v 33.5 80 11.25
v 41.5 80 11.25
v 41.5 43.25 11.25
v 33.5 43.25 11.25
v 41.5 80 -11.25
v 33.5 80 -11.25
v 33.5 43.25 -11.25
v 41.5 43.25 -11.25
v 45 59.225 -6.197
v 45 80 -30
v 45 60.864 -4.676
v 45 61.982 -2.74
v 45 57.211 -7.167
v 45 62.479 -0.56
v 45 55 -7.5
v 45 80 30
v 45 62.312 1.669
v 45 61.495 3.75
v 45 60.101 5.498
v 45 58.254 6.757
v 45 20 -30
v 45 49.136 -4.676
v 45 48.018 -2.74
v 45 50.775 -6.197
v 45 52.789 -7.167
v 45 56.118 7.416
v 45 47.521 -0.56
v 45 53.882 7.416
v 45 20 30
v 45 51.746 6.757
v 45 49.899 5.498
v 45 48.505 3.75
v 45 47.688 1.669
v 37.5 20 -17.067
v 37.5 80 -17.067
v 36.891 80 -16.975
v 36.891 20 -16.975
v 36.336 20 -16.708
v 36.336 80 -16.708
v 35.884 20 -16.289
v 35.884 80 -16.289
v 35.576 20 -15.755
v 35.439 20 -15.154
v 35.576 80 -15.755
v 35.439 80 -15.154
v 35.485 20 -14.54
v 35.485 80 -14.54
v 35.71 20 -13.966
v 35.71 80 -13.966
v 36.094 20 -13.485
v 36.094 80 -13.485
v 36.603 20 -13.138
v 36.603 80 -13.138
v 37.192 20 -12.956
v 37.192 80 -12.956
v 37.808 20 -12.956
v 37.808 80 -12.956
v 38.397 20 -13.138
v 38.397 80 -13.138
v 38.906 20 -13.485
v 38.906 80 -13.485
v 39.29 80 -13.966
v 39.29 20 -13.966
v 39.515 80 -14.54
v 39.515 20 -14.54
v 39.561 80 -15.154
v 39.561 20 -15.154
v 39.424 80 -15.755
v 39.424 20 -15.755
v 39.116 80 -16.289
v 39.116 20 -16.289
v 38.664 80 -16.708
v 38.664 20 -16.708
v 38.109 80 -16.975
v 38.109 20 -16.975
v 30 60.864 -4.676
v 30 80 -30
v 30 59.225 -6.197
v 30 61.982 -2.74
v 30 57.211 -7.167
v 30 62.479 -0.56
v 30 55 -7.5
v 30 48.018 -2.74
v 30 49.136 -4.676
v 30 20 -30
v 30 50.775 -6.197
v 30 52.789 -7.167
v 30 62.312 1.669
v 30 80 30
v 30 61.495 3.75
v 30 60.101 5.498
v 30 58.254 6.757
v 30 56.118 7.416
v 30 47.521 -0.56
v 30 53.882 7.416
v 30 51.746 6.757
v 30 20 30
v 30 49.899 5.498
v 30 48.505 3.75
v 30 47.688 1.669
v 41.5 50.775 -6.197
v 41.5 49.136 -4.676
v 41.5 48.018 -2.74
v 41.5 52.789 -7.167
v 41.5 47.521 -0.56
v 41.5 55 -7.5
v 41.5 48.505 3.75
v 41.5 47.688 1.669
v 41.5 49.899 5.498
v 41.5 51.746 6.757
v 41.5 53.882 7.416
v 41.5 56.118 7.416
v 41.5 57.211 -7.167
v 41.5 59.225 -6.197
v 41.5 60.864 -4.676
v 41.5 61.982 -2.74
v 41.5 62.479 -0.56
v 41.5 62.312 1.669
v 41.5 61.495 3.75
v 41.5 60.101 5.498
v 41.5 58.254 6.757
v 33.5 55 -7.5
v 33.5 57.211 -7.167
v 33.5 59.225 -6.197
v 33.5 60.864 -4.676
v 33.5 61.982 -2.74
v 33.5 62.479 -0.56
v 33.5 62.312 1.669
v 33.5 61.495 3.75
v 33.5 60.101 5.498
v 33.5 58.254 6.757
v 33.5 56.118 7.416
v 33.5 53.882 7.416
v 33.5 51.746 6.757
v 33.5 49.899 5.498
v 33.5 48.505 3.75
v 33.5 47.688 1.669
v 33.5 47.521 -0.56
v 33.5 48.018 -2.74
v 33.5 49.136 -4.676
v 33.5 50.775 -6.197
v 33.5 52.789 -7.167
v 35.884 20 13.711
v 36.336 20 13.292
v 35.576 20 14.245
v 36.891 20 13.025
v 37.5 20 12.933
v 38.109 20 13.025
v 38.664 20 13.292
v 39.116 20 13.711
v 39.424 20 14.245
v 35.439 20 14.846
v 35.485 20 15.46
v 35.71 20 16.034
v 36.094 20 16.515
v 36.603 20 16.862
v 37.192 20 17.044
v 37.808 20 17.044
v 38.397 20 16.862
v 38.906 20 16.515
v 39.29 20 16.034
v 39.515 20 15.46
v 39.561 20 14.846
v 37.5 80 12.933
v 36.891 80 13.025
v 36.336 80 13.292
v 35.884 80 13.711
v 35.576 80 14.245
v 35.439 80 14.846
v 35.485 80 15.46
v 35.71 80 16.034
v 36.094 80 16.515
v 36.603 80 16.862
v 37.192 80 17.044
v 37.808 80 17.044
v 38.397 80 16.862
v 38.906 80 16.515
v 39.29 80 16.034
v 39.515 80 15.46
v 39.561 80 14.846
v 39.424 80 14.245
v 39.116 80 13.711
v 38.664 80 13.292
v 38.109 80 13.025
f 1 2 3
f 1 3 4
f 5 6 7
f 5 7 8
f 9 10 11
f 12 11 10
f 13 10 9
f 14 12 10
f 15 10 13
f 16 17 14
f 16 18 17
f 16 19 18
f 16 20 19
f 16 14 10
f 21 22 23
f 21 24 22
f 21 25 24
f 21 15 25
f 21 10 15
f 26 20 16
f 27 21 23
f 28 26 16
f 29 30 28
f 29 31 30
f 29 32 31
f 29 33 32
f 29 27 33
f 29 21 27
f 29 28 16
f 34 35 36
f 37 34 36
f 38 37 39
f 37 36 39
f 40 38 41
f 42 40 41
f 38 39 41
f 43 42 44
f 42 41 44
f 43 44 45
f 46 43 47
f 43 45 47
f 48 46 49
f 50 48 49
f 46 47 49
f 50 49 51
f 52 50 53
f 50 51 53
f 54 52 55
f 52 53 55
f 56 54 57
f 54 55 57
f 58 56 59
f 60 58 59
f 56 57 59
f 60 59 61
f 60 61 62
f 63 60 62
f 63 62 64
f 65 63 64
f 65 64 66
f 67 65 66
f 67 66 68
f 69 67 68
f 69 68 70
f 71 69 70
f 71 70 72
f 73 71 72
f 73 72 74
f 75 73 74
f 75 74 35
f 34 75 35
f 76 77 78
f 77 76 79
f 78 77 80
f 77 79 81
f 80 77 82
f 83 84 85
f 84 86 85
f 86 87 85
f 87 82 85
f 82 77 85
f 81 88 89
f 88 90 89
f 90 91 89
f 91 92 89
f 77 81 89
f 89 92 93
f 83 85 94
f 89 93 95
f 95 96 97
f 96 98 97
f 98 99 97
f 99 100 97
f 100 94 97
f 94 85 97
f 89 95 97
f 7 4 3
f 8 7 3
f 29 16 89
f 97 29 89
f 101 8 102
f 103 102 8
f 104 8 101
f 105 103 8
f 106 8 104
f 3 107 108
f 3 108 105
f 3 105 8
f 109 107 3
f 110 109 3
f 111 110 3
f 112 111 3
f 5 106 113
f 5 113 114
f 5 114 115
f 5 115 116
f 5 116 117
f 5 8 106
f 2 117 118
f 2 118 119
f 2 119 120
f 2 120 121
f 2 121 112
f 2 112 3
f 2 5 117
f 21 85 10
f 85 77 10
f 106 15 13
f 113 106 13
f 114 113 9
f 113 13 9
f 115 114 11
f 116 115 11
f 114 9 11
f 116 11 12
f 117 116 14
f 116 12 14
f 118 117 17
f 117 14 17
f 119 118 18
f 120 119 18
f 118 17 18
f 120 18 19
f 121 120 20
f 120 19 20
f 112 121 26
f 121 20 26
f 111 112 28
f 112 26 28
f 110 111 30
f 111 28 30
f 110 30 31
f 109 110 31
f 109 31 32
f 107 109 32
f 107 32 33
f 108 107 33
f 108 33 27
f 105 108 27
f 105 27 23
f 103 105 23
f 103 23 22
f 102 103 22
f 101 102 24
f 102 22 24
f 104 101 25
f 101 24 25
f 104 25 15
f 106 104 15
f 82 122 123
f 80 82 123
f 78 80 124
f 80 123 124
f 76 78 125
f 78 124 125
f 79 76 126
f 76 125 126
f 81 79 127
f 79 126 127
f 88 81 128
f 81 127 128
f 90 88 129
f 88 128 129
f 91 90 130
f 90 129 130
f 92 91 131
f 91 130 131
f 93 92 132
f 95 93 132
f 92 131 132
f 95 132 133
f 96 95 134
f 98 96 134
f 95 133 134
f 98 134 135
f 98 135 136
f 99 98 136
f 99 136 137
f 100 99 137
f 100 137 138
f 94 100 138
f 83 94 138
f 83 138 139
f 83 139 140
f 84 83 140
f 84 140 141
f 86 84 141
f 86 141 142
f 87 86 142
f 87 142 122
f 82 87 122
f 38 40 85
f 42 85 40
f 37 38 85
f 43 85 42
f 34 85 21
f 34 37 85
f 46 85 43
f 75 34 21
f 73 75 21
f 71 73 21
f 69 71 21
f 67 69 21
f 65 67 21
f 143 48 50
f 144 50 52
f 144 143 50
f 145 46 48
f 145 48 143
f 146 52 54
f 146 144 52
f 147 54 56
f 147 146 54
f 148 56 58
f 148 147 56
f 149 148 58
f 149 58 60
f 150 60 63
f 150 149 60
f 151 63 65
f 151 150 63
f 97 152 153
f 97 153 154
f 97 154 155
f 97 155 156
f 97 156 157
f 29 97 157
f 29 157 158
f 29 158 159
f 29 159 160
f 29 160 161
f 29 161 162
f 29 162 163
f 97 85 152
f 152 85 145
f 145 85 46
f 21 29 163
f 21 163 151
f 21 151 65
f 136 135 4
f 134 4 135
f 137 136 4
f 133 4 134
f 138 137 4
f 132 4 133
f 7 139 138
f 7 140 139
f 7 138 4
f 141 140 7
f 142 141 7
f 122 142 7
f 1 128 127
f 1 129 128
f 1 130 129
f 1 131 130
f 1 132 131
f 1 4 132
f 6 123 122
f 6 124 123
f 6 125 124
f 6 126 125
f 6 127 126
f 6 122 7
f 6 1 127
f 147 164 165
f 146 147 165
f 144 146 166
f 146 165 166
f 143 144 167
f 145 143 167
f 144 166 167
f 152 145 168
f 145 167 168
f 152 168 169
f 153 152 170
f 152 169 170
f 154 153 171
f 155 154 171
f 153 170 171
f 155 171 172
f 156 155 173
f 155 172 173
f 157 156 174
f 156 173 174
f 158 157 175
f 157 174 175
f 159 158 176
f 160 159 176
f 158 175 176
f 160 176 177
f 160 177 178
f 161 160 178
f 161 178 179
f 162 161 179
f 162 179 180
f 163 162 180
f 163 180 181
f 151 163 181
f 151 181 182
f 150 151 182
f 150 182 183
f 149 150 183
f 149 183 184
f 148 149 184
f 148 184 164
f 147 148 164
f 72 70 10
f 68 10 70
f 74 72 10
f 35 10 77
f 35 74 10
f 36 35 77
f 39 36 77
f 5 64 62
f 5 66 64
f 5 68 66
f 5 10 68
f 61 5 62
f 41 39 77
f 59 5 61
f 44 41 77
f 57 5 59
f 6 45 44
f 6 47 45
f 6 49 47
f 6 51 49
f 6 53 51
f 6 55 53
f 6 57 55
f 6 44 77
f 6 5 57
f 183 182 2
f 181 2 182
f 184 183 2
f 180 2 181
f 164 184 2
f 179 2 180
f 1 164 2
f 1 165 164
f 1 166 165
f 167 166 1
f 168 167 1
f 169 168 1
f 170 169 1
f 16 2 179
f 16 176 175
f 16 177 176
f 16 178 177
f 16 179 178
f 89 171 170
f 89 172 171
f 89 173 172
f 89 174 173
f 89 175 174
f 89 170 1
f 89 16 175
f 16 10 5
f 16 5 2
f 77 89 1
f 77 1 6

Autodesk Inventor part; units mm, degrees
ref_plane "YZ Plane" through (0, 0, 0) normal (1, 0, 0) x (0, 1, 0)
ref_plane "XZ Plane" through (0, 0, 0) normal (0, 1, 0) x (-1, 0, 0)
ref_plane "XY Plane" through (0, 0, 0) normal (0, 0, 1) x (1, 0, 0)
sketch "Sketch1" plane through (0, 0, 0) normal (0, 1, 0) x (-1, 0, 0)
  line L0 (45, -30) -> (-45, -30)
  line L1 (-45, -30) -> (-45, 30)
  line L2 (-45, 30) -> (45, 30)
  line L3 (45, 30) -> (45, -30)
  line L4 (45, -30) -> (-45, 30) construction
  line L5 (-45, -30) -> (45, 30) construction
  line L6 (30, -30) -> (-30, -30)
  line L7 (-30, -30) -> (-30, 30)
  line L8 (-30, 30) -> (30, 30)
  line L9 (30, 30) -> (30, -30)
  line L10 (30, -30) -> (-30, 30) construction
  line L11 (-30, -30) -> (30, 30) construction
  point P0 (0, 0)
  point P1 (30, -30)
  point P2 (30, 30)
  dimension "d0" = 90
  dimension "d1" = 60
  dimension "d2" = 60
extrude "Extrusion1" add sketch "Sketch1" against normal blind 10 contours L0 L7 L2 L9
extrude "Extrusion2" add sketch "Sketch1" along normal blind 80 and the other way blind 10 contours L0 L9 L2 L3 | L0 L1 L2 L7
sketch "Sketch3" plane through (0, -10, 0) normal (0, -1, 0) x (1, 0, 0)
  point P0 (0, 0)
  point P1 (0, 5)
  point P2 (0, -5)
  dimension "d16" = 5
  dimension "d17" = 5
hole "Hole2" at (0, -10, 5) at (0, -10, -5) direction (0, 1, 0) diameter 5.5 end through all clearance for "Hex Head Bolt" size "M5" standard "Ansi Metric M Profile"
sketch "Sketch4" plane through (45, -10, -30) normal (1, 0, 0) x (0, 0, -1)
  circle A0 centre (-30, 65) radius 11
  line L0 (-41, 65) -> (-41, 90)
  line L1 (-60, 90) -> (0, 90) projected
  line L2 (-19, 65) -> (-19, 90)
  circle A1 centre (-30, 65) radius 7.5
  point P0 (-30, 10)
  dimension "d25" = 22
  dimension "d26" = 15
  dimension "d27" = 25
extrude "Extrusion3" cut sketch "Sketch4" against normal through all contours A1
sketch "Sketch5" plane through (0, 80, 0) normal (0, 1, 0) x (1, 0, 0)
  line L0 (-41.5, 11.25) -> (-33.5, 11.25)
  line L1 (-33.5, 11.25) -> (-33.5, -11.25)
  line L2 (-33.5, -11.25) -> (-41.5, -11.25)
  line L3 (-41.5, -11.25) -> (-41.5, 11.25)
  line L4 (-41.5, 11.25) -> (-33.5, -11.25) construction
  line L5 (-33.5, 11.25) -> (-41.5, -11.25) construction
  line L6 (33.5, 11.25) -> (41.5, 11.25)
  line L7 (41.5, 11.25) -> (41.5, -11.25)
  line L8 (41.5, -11.25) -> (33.5, -11.25)
  line L9 (33.5, -11.25) -> (33.5, 11.25)
  line L10 (33.5, 11.25) -> (41.5, -11.25) construction
  line L11 (41.5, 11.25) -> (33.5, -11.25) construction
  line L12 (-45, 30) -> (-45, -30) projected
  line L13 (-30, 30) -> (-45, 30) projected
  line L14 (45, 30) -> (30, 30) projected
  point P0 (0, 0)
  point P1 (-37.5, 0)
  point P2 (37.5, 0)
  point P3 (-37.5, 0)
  point P4 (37.5, 0)
  point P5 (-37.5, 0)
  point P6 (-45, 0)
  point P7 (-37.5, 30)
  point P8 (-37.5, 11.25)
  point P9 (37.5, 11.25)
  point P10 (37.5, 30)
  dimension "d32" = 8
  dimension "d33" = 22.5
  dimension "d34" = 8
  dimension "d35" = 22.5
extrude "Extrusion5" cut sketch "Sketch5" against normal blind 36.75
sketch "Sketch6" plane through (45, -10, -30) normal (1, 0, 0) x (0, 0, -1)
  point P0 (-30, 10)
sketch "Sketch7" plane through (-45, -10, 30) normal (-1, 0, 0) x (0, 0, 1)
  line L0 (-69.6025, -105.0508) -> (27.4472, -105.0508)
  line L1 (27.4472, -105.0508) -> (27.4472, 137.5734)
  line L2 (27.4472, 137.5734) -> (-69.6025, 137.5734)
  line L3 (-69.6025, 137.5734) -> (-69.6025, -105.0508)
  point P0 (-30, 10)
extrude "Extrusion6" cut sketch "Sketch7" against normal up to surface (75 mm away)
sketch "Sketch8" plane through (0, -10, 0) normal (0, -1, 0) x (1, 0, 0)
  line L0 (55.2414, 58.8952) -> (10.7003, 58.8952)
  line L1 (10.7003, 58.8952) -> (10.7003, -57.3293)
  line L2 (10.7003, -57.3293) -> (55.2414, -57.3293)
  line L3 (55.2414, -57.3293) -> (55.2414, 58.8952)
  point P0 (0, 0)
extrude "Extrusion7" cut sketch "Sketch8" against normal blind 30
sketch "Sketch9" plane through (0, 20, 0) normal (0, -1, 0) x (1, 0, 0)
  line L0 (45, -30) -> (30, -30) projected
  line L1 (30, 30) -> (45, 30) projected
  point P0 (0, 0)
  point P1 (37.5, 15)
  point P2 (37.5, -15)
  point P3 (37.5, -30)
  dimension "d45" = 15
  dimension "d46" = 15
hole "Hole3" at (37.5, 20, 15) at (37.5, 20, -15) direction (0, 1, 0) diameter 4.134 end through all thread size "M5x0.8" class "6H" standard "ISO Metric profile"
equation "\"d34\" = d32"
equation "\"d35\" = d33"
properties part number "Soporte_Horizontal_Modificado" material "ABS Plastic"
